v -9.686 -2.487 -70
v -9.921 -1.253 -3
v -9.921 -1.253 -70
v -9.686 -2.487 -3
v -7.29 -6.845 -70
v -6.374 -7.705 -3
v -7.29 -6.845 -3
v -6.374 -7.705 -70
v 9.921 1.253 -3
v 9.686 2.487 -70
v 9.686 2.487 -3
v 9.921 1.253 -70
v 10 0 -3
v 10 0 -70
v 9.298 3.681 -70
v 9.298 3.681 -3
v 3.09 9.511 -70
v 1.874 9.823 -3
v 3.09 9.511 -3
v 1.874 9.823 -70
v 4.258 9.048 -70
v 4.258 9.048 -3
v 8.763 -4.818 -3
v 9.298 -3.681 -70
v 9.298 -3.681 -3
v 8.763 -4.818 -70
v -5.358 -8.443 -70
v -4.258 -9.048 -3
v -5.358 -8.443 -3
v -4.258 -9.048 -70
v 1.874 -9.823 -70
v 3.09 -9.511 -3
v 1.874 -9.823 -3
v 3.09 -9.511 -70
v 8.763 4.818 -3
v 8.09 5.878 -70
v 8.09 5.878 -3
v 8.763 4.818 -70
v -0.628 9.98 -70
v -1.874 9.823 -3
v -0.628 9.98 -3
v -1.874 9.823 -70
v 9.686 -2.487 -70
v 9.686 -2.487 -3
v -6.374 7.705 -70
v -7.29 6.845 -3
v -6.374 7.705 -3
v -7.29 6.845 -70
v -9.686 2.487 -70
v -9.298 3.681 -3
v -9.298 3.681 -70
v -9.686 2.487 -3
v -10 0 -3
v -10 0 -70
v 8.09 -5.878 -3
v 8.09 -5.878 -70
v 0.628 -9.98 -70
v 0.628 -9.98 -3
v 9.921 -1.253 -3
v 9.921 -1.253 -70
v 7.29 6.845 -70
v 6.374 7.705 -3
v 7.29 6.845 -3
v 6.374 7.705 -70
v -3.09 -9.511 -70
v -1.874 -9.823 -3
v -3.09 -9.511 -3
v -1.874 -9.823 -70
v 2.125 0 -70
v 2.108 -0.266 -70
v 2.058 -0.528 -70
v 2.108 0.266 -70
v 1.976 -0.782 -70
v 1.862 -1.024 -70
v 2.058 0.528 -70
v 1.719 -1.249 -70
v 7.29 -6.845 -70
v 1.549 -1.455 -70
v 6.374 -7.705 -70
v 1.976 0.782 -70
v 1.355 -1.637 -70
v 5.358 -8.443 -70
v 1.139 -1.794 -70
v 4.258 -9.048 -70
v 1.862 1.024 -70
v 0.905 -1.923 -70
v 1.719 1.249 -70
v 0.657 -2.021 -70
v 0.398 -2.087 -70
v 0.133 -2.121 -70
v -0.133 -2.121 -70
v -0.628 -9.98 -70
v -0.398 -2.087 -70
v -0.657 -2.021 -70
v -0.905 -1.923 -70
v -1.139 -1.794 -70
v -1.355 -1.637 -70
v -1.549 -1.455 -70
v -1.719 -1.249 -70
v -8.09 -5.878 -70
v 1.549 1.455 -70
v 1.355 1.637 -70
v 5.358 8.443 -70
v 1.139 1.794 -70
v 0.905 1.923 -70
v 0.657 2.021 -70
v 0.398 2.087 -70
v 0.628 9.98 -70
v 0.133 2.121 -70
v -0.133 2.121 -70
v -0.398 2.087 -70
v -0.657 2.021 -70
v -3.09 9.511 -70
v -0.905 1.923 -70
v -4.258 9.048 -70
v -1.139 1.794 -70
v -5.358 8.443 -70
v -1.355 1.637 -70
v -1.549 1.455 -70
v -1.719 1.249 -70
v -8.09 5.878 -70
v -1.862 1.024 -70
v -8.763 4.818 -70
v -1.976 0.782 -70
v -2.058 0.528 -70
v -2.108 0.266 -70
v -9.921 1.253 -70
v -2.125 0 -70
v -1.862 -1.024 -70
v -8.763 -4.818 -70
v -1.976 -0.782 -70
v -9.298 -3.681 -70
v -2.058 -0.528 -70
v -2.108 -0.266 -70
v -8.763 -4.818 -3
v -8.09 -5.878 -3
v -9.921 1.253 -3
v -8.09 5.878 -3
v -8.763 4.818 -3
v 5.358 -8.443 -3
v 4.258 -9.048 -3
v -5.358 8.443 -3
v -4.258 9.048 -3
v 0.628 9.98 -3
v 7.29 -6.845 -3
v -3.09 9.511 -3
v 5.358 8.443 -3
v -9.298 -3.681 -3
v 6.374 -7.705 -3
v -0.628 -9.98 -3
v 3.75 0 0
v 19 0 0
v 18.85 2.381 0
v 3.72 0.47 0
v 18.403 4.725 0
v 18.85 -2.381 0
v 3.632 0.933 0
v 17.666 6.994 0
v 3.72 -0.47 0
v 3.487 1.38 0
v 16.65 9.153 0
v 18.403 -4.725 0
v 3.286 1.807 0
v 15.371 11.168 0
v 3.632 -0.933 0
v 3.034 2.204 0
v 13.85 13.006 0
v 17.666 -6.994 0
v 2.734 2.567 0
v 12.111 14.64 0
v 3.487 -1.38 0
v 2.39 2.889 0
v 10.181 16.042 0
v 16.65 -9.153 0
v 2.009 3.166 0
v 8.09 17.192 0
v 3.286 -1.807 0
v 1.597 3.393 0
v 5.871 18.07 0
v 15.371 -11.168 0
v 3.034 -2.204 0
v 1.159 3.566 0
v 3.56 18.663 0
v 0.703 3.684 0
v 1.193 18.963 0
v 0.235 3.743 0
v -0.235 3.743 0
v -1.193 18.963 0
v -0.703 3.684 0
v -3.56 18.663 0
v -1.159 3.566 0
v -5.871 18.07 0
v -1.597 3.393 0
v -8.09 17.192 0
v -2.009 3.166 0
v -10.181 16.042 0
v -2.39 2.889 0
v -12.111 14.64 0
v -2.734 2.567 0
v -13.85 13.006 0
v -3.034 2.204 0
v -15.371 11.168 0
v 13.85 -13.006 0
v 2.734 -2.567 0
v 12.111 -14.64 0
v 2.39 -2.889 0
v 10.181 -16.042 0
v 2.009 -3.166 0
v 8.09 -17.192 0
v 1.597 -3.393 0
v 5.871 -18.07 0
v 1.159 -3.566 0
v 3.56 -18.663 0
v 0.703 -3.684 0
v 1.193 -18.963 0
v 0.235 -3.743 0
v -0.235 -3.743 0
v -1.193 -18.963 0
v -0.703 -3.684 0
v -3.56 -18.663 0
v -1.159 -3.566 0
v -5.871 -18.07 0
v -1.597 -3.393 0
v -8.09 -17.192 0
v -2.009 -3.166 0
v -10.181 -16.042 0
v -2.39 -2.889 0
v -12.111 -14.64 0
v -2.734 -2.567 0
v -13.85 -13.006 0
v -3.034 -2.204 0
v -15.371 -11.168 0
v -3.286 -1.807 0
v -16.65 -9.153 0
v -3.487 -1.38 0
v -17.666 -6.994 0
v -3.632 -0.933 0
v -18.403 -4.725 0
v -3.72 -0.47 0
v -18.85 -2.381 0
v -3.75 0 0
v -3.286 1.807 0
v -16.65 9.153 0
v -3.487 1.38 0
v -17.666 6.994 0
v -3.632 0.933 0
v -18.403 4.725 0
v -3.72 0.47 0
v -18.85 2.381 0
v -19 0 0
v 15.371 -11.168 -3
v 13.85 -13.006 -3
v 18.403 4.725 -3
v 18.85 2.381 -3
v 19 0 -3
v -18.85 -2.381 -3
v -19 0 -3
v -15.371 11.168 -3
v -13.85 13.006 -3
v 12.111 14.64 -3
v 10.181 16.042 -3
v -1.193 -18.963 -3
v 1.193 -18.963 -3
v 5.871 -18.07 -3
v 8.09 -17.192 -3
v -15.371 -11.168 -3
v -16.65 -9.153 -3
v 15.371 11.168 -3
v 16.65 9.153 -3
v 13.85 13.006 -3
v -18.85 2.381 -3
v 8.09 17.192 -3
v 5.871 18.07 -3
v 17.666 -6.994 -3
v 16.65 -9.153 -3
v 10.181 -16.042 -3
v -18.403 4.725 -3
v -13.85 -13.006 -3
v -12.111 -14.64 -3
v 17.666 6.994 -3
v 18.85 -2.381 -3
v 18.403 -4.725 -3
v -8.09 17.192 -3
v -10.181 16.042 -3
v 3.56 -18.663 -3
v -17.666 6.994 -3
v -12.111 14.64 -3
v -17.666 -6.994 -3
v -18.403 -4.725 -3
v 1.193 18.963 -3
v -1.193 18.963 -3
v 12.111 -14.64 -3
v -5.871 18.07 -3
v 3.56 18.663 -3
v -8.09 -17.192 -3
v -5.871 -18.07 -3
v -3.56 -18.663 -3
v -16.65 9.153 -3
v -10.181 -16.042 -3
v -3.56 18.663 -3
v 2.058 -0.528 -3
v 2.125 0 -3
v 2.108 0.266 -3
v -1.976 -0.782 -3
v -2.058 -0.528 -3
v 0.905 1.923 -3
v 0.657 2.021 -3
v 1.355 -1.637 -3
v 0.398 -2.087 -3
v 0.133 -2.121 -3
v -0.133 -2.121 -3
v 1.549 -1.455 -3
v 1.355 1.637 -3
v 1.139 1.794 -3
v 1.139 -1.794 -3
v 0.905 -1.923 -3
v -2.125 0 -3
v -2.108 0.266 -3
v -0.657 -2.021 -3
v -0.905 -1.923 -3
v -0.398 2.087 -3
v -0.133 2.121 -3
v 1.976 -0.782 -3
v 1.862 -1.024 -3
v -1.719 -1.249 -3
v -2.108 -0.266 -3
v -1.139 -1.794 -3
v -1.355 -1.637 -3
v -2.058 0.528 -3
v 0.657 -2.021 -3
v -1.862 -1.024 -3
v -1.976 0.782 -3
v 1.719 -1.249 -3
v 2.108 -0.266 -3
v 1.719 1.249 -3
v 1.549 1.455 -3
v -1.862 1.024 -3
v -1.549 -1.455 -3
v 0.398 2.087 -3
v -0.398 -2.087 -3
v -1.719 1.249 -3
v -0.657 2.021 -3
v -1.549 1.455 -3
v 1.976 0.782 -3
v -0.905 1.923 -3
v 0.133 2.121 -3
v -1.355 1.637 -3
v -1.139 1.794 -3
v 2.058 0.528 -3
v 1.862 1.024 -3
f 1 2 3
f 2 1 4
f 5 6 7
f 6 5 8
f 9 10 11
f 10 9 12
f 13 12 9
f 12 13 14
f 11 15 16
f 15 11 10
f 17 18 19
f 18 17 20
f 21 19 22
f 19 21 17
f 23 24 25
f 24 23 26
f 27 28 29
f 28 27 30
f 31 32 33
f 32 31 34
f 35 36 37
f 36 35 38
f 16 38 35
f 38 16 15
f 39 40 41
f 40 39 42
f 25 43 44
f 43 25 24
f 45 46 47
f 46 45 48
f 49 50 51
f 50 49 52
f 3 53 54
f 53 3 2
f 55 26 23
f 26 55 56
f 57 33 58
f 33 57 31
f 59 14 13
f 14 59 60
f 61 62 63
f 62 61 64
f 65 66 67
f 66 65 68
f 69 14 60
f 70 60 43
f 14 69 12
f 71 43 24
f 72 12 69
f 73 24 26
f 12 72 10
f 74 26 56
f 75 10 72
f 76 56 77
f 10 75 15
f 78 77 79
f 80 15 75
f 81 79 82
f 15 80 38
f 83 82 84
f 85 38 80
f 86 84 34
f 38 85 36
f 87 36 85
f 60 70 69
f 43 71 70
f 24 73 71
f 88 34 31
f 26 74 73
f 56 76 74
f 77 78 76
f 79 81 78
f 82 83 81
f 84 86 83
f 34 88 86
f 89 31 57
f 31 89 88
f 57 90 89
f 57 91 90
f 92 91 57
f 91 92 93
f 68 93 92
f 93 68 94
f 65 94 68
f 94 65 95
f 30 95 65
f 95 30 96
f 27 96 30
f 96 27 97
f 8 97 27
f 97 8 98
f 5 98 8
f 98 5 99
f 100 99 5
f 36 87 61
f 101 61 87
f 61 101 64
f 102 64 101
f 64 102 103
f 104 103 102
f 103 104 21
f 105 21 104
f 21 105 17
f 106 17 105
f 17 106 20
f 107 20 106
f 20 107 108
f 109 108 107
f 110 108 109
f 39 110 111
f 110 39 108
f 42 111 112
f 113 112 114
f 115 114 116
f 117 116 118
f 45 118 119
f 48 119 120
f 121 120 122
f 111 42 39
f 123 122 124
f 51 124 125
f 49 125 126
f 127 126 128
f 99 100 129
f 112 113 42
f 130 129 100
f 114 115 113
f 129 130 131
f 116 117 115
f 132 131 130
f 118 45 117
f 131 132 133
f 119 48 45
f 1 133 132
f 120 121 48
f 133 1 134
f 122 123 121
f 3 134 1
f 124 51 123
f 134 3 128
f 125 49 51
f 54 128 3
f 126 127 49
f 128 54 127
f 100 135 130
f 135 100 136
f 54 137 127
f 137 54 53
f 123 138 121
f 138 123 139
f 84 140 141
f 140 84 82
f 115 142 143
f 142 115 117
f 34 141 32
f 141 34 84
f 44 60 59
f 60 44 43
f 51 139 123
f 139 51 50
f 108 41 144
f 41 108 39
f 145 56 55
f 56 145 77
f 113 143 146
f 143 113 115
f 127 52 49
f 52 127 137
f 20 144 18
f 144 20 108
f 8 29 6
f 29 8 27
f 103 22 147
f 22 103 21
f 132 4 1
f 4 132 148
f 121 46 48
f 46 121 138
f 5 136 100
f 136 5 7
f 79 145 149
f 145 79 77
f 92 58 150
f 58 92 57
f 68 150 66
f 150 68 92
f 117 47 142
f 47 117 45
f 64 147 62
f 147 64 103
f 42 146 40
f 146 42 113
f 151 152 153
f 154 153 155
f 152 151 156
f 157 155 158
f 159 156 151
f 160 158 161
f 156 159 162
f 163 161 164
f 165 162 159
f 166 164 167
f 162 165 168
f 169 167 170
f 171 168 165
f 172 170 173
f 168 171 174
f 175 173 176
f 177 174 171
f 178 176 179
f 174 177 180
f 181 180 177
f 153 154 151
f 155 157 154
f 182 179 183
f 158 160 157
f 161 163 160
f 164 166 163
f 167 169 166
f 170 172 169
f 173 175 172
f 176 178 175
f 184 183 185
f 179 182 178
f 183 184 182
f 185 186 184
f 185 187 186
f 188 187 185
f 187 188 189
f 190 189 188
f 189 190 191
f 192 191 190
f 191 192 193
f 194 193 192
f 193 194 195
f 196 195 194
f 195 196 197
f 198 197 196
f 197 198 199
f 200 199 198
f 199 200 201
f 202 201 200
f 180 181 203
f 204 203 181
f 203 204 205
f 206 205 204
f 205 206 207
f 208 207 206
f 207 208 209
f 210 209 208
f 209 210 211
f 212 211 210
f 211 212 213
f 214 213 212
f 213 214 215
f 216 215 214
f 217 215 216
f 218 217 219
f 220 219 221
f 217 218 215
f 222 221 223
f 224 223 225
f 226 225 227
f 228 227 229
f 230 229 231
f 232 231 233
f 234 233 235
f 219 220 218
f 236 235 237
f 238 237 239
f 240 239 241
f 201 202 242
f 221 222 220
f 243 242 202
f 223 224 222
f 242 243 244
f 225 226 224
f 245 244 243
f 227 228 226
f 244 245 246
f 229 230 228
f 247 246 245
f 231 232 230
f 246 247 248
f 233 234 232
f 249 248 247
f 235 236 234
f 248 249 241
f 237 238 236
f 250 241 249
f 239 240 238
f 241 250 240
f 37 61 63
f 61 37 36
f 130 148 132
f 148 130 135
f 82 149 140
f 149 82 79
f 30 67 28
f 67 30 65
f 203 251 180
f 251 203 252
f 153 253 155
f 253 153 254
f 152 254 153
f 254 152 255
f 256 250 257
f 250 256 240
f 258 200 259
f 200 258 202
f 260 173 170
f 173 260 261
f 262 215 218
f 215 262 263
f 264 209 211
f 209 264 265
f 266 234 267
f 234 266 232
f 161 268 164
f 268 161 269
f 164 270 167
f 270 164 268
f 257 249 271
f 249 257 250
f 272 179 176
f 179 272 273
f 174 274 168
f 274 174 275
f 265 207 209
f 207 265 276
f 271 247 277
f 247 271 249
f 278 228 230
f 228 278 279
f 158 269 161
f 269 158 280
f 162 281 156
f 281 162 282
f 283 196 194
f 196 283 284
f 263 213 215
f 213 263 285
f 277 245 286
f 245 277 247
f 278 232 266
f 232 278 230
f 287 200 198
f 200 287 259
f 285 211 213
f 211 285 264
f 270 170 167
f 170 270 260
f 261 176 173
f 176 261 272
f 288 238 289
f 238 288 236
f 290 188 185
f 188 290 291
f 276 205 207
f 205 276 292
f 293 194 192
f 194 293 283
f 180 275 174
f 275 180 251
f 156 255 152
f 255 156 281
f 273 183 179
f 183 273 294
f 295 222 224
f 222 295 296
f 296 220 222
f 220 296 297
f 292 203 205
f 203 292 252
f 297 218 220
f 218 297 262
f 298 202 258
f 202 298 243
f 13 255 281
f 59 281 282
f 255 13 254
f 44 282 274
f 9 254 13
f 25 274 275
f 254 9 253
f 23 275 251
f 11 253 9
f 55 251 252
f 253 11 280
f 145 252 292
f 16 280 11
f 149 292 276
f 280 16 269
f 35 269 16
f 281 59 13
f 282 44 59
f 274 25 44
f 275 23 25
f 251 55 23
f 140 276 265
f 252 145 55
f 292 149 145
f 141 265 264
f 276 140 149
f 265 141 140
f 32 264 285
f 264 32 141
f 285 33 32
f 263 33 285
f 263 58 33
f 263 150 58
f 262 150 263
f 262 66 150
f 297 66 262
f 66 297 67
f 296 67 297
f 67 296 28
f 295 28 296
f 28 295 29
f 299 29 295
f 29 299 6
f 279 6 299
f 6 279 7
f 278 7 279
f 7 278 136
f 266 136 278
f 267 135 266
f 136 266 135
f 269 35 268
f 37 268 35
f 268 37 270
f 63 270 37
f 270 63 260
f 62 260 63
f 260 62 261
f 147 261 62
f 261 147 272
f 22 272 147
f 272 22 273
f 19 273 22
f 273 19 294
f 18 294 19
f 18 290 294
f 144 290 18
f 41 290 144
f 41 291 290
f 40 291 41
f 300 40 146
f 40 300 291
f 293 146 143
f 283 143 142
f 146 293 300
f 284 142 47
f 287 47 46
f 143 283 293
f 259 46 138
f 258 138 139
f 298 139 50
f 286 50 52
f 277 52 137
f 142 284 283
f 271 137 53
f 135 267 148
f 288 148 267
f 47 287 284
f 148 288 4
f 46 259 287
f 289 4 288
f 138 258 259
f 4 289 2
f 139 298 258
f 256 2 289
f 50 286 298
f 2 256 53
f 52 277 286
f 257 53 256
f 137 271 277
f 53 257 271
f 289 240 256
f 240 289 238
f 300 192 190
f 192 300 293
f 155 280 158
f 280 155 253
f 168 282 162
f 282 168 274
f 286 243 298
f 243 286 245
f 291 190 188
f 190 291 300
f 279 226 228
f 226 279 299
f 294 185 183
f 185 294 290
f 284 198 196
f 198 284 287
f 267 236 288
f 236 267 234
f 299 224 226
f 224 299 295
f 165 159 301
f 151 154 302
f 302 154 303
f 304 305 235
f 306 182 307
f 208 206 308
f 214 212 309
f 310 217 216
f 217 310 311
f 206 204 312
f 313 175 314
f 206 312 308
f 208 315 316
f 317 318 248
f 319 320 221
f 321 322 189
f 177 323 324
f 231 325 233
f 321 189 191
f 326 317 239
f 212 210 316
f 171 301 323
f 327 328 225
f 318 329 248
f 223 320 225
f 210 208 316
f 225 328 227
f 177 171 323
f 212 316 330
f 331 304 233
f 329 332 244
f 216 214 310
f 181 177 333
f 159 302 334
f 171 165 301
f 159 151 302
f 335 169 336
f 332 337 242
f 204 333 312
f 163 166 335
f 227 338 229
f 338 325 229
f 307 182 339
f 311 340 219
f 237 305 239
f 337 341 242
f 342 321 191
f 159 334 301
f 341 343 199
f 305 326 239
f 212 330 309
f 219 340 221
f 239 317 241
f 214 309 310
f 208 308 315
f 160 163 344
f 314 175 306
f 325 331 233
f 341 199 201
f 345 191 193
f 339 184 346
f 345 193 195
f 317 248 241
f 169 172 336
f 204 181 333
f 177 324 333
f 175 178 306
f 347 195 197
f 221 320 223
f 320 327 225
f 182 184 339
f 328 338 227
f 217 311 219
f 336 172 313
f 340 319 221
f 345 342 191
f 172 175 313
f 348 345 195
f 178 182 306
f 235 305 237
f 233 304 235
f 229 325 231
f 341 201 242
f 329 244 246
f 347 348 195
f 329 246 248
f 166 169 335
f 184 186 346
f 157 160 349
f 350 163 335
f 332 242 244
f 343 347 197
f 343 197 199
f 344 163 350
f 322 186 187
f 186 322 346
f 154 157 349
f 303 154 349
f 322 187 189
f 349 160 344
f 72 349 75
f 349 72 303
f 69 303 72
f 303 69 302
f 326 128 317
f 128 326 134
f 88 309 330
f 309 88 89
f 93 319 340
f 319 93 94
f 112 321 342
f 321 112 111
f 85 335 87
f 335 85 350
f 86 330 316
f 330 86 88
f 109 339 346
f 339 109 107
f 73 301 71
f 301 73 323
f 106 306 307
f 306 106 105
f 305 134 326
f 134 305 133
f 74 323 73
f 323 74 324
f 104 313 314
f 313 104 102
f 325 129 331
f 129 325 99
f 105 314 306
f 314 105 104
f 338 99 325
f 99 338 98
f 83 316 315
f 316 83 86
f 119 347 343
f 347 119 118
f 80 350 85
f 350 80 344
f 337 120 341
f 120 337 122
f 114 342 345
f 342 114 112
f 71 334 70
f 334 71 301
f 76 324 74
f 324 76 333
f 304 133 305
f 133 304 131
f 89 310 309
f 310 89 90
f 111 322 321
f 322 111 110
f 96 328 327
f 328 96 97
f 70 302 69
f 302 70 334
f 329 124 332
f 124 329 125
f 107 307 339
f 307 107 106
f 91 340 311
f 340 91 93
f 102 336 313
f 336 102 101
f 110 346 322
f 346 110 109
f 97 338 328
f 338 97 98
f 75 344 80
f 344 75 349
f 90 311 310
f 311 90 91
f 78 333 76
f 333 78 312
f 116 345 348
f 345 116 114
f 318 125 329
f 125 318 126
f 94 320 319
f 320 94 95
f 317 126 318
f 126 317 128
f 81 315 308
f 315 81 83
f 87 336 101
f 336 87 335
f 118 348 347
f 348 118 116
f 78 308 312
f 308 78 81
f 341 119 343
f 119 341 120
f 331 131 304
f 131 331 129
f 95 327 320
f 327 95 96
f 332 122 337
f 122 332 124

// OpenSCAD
$fn = 50;


difference() {
	union() {
		translate(v = [0, 0, -70.0000000000]) {
			cylinder(h = 70, r = 10.0000000000);
		}
		translate(v = [0, 0, -3.0000000000]) {
			cylinder(h = 3, r = 19.0000000000);
		}
	}
	union() {
		translate(v = [0, 0, 0]) {
			rotate(a = [0, 0, 0]) {
				difference() {
					union() {
						#translate(v = [0, 0, -70.0000000000]) {
							cylinder(h = 70, r = 2.0000000000);
						}
						#translate(v = [0, 0, -3]) {
							cylinder(h = 3, r1 = 2.1250000000, r2 = 3.7500000000);
						}
						#translate(v = [0, 0, -70.0000000000]) {
							cylinder(h = 70, r = 2.1250000000);
						}
						#translate(v = [0, 0, -70.0000000000]) {
							cylinder(h = 70, r = 2.0000000000);
						}
					}
					union();
				}
			}
		}
	}
}
